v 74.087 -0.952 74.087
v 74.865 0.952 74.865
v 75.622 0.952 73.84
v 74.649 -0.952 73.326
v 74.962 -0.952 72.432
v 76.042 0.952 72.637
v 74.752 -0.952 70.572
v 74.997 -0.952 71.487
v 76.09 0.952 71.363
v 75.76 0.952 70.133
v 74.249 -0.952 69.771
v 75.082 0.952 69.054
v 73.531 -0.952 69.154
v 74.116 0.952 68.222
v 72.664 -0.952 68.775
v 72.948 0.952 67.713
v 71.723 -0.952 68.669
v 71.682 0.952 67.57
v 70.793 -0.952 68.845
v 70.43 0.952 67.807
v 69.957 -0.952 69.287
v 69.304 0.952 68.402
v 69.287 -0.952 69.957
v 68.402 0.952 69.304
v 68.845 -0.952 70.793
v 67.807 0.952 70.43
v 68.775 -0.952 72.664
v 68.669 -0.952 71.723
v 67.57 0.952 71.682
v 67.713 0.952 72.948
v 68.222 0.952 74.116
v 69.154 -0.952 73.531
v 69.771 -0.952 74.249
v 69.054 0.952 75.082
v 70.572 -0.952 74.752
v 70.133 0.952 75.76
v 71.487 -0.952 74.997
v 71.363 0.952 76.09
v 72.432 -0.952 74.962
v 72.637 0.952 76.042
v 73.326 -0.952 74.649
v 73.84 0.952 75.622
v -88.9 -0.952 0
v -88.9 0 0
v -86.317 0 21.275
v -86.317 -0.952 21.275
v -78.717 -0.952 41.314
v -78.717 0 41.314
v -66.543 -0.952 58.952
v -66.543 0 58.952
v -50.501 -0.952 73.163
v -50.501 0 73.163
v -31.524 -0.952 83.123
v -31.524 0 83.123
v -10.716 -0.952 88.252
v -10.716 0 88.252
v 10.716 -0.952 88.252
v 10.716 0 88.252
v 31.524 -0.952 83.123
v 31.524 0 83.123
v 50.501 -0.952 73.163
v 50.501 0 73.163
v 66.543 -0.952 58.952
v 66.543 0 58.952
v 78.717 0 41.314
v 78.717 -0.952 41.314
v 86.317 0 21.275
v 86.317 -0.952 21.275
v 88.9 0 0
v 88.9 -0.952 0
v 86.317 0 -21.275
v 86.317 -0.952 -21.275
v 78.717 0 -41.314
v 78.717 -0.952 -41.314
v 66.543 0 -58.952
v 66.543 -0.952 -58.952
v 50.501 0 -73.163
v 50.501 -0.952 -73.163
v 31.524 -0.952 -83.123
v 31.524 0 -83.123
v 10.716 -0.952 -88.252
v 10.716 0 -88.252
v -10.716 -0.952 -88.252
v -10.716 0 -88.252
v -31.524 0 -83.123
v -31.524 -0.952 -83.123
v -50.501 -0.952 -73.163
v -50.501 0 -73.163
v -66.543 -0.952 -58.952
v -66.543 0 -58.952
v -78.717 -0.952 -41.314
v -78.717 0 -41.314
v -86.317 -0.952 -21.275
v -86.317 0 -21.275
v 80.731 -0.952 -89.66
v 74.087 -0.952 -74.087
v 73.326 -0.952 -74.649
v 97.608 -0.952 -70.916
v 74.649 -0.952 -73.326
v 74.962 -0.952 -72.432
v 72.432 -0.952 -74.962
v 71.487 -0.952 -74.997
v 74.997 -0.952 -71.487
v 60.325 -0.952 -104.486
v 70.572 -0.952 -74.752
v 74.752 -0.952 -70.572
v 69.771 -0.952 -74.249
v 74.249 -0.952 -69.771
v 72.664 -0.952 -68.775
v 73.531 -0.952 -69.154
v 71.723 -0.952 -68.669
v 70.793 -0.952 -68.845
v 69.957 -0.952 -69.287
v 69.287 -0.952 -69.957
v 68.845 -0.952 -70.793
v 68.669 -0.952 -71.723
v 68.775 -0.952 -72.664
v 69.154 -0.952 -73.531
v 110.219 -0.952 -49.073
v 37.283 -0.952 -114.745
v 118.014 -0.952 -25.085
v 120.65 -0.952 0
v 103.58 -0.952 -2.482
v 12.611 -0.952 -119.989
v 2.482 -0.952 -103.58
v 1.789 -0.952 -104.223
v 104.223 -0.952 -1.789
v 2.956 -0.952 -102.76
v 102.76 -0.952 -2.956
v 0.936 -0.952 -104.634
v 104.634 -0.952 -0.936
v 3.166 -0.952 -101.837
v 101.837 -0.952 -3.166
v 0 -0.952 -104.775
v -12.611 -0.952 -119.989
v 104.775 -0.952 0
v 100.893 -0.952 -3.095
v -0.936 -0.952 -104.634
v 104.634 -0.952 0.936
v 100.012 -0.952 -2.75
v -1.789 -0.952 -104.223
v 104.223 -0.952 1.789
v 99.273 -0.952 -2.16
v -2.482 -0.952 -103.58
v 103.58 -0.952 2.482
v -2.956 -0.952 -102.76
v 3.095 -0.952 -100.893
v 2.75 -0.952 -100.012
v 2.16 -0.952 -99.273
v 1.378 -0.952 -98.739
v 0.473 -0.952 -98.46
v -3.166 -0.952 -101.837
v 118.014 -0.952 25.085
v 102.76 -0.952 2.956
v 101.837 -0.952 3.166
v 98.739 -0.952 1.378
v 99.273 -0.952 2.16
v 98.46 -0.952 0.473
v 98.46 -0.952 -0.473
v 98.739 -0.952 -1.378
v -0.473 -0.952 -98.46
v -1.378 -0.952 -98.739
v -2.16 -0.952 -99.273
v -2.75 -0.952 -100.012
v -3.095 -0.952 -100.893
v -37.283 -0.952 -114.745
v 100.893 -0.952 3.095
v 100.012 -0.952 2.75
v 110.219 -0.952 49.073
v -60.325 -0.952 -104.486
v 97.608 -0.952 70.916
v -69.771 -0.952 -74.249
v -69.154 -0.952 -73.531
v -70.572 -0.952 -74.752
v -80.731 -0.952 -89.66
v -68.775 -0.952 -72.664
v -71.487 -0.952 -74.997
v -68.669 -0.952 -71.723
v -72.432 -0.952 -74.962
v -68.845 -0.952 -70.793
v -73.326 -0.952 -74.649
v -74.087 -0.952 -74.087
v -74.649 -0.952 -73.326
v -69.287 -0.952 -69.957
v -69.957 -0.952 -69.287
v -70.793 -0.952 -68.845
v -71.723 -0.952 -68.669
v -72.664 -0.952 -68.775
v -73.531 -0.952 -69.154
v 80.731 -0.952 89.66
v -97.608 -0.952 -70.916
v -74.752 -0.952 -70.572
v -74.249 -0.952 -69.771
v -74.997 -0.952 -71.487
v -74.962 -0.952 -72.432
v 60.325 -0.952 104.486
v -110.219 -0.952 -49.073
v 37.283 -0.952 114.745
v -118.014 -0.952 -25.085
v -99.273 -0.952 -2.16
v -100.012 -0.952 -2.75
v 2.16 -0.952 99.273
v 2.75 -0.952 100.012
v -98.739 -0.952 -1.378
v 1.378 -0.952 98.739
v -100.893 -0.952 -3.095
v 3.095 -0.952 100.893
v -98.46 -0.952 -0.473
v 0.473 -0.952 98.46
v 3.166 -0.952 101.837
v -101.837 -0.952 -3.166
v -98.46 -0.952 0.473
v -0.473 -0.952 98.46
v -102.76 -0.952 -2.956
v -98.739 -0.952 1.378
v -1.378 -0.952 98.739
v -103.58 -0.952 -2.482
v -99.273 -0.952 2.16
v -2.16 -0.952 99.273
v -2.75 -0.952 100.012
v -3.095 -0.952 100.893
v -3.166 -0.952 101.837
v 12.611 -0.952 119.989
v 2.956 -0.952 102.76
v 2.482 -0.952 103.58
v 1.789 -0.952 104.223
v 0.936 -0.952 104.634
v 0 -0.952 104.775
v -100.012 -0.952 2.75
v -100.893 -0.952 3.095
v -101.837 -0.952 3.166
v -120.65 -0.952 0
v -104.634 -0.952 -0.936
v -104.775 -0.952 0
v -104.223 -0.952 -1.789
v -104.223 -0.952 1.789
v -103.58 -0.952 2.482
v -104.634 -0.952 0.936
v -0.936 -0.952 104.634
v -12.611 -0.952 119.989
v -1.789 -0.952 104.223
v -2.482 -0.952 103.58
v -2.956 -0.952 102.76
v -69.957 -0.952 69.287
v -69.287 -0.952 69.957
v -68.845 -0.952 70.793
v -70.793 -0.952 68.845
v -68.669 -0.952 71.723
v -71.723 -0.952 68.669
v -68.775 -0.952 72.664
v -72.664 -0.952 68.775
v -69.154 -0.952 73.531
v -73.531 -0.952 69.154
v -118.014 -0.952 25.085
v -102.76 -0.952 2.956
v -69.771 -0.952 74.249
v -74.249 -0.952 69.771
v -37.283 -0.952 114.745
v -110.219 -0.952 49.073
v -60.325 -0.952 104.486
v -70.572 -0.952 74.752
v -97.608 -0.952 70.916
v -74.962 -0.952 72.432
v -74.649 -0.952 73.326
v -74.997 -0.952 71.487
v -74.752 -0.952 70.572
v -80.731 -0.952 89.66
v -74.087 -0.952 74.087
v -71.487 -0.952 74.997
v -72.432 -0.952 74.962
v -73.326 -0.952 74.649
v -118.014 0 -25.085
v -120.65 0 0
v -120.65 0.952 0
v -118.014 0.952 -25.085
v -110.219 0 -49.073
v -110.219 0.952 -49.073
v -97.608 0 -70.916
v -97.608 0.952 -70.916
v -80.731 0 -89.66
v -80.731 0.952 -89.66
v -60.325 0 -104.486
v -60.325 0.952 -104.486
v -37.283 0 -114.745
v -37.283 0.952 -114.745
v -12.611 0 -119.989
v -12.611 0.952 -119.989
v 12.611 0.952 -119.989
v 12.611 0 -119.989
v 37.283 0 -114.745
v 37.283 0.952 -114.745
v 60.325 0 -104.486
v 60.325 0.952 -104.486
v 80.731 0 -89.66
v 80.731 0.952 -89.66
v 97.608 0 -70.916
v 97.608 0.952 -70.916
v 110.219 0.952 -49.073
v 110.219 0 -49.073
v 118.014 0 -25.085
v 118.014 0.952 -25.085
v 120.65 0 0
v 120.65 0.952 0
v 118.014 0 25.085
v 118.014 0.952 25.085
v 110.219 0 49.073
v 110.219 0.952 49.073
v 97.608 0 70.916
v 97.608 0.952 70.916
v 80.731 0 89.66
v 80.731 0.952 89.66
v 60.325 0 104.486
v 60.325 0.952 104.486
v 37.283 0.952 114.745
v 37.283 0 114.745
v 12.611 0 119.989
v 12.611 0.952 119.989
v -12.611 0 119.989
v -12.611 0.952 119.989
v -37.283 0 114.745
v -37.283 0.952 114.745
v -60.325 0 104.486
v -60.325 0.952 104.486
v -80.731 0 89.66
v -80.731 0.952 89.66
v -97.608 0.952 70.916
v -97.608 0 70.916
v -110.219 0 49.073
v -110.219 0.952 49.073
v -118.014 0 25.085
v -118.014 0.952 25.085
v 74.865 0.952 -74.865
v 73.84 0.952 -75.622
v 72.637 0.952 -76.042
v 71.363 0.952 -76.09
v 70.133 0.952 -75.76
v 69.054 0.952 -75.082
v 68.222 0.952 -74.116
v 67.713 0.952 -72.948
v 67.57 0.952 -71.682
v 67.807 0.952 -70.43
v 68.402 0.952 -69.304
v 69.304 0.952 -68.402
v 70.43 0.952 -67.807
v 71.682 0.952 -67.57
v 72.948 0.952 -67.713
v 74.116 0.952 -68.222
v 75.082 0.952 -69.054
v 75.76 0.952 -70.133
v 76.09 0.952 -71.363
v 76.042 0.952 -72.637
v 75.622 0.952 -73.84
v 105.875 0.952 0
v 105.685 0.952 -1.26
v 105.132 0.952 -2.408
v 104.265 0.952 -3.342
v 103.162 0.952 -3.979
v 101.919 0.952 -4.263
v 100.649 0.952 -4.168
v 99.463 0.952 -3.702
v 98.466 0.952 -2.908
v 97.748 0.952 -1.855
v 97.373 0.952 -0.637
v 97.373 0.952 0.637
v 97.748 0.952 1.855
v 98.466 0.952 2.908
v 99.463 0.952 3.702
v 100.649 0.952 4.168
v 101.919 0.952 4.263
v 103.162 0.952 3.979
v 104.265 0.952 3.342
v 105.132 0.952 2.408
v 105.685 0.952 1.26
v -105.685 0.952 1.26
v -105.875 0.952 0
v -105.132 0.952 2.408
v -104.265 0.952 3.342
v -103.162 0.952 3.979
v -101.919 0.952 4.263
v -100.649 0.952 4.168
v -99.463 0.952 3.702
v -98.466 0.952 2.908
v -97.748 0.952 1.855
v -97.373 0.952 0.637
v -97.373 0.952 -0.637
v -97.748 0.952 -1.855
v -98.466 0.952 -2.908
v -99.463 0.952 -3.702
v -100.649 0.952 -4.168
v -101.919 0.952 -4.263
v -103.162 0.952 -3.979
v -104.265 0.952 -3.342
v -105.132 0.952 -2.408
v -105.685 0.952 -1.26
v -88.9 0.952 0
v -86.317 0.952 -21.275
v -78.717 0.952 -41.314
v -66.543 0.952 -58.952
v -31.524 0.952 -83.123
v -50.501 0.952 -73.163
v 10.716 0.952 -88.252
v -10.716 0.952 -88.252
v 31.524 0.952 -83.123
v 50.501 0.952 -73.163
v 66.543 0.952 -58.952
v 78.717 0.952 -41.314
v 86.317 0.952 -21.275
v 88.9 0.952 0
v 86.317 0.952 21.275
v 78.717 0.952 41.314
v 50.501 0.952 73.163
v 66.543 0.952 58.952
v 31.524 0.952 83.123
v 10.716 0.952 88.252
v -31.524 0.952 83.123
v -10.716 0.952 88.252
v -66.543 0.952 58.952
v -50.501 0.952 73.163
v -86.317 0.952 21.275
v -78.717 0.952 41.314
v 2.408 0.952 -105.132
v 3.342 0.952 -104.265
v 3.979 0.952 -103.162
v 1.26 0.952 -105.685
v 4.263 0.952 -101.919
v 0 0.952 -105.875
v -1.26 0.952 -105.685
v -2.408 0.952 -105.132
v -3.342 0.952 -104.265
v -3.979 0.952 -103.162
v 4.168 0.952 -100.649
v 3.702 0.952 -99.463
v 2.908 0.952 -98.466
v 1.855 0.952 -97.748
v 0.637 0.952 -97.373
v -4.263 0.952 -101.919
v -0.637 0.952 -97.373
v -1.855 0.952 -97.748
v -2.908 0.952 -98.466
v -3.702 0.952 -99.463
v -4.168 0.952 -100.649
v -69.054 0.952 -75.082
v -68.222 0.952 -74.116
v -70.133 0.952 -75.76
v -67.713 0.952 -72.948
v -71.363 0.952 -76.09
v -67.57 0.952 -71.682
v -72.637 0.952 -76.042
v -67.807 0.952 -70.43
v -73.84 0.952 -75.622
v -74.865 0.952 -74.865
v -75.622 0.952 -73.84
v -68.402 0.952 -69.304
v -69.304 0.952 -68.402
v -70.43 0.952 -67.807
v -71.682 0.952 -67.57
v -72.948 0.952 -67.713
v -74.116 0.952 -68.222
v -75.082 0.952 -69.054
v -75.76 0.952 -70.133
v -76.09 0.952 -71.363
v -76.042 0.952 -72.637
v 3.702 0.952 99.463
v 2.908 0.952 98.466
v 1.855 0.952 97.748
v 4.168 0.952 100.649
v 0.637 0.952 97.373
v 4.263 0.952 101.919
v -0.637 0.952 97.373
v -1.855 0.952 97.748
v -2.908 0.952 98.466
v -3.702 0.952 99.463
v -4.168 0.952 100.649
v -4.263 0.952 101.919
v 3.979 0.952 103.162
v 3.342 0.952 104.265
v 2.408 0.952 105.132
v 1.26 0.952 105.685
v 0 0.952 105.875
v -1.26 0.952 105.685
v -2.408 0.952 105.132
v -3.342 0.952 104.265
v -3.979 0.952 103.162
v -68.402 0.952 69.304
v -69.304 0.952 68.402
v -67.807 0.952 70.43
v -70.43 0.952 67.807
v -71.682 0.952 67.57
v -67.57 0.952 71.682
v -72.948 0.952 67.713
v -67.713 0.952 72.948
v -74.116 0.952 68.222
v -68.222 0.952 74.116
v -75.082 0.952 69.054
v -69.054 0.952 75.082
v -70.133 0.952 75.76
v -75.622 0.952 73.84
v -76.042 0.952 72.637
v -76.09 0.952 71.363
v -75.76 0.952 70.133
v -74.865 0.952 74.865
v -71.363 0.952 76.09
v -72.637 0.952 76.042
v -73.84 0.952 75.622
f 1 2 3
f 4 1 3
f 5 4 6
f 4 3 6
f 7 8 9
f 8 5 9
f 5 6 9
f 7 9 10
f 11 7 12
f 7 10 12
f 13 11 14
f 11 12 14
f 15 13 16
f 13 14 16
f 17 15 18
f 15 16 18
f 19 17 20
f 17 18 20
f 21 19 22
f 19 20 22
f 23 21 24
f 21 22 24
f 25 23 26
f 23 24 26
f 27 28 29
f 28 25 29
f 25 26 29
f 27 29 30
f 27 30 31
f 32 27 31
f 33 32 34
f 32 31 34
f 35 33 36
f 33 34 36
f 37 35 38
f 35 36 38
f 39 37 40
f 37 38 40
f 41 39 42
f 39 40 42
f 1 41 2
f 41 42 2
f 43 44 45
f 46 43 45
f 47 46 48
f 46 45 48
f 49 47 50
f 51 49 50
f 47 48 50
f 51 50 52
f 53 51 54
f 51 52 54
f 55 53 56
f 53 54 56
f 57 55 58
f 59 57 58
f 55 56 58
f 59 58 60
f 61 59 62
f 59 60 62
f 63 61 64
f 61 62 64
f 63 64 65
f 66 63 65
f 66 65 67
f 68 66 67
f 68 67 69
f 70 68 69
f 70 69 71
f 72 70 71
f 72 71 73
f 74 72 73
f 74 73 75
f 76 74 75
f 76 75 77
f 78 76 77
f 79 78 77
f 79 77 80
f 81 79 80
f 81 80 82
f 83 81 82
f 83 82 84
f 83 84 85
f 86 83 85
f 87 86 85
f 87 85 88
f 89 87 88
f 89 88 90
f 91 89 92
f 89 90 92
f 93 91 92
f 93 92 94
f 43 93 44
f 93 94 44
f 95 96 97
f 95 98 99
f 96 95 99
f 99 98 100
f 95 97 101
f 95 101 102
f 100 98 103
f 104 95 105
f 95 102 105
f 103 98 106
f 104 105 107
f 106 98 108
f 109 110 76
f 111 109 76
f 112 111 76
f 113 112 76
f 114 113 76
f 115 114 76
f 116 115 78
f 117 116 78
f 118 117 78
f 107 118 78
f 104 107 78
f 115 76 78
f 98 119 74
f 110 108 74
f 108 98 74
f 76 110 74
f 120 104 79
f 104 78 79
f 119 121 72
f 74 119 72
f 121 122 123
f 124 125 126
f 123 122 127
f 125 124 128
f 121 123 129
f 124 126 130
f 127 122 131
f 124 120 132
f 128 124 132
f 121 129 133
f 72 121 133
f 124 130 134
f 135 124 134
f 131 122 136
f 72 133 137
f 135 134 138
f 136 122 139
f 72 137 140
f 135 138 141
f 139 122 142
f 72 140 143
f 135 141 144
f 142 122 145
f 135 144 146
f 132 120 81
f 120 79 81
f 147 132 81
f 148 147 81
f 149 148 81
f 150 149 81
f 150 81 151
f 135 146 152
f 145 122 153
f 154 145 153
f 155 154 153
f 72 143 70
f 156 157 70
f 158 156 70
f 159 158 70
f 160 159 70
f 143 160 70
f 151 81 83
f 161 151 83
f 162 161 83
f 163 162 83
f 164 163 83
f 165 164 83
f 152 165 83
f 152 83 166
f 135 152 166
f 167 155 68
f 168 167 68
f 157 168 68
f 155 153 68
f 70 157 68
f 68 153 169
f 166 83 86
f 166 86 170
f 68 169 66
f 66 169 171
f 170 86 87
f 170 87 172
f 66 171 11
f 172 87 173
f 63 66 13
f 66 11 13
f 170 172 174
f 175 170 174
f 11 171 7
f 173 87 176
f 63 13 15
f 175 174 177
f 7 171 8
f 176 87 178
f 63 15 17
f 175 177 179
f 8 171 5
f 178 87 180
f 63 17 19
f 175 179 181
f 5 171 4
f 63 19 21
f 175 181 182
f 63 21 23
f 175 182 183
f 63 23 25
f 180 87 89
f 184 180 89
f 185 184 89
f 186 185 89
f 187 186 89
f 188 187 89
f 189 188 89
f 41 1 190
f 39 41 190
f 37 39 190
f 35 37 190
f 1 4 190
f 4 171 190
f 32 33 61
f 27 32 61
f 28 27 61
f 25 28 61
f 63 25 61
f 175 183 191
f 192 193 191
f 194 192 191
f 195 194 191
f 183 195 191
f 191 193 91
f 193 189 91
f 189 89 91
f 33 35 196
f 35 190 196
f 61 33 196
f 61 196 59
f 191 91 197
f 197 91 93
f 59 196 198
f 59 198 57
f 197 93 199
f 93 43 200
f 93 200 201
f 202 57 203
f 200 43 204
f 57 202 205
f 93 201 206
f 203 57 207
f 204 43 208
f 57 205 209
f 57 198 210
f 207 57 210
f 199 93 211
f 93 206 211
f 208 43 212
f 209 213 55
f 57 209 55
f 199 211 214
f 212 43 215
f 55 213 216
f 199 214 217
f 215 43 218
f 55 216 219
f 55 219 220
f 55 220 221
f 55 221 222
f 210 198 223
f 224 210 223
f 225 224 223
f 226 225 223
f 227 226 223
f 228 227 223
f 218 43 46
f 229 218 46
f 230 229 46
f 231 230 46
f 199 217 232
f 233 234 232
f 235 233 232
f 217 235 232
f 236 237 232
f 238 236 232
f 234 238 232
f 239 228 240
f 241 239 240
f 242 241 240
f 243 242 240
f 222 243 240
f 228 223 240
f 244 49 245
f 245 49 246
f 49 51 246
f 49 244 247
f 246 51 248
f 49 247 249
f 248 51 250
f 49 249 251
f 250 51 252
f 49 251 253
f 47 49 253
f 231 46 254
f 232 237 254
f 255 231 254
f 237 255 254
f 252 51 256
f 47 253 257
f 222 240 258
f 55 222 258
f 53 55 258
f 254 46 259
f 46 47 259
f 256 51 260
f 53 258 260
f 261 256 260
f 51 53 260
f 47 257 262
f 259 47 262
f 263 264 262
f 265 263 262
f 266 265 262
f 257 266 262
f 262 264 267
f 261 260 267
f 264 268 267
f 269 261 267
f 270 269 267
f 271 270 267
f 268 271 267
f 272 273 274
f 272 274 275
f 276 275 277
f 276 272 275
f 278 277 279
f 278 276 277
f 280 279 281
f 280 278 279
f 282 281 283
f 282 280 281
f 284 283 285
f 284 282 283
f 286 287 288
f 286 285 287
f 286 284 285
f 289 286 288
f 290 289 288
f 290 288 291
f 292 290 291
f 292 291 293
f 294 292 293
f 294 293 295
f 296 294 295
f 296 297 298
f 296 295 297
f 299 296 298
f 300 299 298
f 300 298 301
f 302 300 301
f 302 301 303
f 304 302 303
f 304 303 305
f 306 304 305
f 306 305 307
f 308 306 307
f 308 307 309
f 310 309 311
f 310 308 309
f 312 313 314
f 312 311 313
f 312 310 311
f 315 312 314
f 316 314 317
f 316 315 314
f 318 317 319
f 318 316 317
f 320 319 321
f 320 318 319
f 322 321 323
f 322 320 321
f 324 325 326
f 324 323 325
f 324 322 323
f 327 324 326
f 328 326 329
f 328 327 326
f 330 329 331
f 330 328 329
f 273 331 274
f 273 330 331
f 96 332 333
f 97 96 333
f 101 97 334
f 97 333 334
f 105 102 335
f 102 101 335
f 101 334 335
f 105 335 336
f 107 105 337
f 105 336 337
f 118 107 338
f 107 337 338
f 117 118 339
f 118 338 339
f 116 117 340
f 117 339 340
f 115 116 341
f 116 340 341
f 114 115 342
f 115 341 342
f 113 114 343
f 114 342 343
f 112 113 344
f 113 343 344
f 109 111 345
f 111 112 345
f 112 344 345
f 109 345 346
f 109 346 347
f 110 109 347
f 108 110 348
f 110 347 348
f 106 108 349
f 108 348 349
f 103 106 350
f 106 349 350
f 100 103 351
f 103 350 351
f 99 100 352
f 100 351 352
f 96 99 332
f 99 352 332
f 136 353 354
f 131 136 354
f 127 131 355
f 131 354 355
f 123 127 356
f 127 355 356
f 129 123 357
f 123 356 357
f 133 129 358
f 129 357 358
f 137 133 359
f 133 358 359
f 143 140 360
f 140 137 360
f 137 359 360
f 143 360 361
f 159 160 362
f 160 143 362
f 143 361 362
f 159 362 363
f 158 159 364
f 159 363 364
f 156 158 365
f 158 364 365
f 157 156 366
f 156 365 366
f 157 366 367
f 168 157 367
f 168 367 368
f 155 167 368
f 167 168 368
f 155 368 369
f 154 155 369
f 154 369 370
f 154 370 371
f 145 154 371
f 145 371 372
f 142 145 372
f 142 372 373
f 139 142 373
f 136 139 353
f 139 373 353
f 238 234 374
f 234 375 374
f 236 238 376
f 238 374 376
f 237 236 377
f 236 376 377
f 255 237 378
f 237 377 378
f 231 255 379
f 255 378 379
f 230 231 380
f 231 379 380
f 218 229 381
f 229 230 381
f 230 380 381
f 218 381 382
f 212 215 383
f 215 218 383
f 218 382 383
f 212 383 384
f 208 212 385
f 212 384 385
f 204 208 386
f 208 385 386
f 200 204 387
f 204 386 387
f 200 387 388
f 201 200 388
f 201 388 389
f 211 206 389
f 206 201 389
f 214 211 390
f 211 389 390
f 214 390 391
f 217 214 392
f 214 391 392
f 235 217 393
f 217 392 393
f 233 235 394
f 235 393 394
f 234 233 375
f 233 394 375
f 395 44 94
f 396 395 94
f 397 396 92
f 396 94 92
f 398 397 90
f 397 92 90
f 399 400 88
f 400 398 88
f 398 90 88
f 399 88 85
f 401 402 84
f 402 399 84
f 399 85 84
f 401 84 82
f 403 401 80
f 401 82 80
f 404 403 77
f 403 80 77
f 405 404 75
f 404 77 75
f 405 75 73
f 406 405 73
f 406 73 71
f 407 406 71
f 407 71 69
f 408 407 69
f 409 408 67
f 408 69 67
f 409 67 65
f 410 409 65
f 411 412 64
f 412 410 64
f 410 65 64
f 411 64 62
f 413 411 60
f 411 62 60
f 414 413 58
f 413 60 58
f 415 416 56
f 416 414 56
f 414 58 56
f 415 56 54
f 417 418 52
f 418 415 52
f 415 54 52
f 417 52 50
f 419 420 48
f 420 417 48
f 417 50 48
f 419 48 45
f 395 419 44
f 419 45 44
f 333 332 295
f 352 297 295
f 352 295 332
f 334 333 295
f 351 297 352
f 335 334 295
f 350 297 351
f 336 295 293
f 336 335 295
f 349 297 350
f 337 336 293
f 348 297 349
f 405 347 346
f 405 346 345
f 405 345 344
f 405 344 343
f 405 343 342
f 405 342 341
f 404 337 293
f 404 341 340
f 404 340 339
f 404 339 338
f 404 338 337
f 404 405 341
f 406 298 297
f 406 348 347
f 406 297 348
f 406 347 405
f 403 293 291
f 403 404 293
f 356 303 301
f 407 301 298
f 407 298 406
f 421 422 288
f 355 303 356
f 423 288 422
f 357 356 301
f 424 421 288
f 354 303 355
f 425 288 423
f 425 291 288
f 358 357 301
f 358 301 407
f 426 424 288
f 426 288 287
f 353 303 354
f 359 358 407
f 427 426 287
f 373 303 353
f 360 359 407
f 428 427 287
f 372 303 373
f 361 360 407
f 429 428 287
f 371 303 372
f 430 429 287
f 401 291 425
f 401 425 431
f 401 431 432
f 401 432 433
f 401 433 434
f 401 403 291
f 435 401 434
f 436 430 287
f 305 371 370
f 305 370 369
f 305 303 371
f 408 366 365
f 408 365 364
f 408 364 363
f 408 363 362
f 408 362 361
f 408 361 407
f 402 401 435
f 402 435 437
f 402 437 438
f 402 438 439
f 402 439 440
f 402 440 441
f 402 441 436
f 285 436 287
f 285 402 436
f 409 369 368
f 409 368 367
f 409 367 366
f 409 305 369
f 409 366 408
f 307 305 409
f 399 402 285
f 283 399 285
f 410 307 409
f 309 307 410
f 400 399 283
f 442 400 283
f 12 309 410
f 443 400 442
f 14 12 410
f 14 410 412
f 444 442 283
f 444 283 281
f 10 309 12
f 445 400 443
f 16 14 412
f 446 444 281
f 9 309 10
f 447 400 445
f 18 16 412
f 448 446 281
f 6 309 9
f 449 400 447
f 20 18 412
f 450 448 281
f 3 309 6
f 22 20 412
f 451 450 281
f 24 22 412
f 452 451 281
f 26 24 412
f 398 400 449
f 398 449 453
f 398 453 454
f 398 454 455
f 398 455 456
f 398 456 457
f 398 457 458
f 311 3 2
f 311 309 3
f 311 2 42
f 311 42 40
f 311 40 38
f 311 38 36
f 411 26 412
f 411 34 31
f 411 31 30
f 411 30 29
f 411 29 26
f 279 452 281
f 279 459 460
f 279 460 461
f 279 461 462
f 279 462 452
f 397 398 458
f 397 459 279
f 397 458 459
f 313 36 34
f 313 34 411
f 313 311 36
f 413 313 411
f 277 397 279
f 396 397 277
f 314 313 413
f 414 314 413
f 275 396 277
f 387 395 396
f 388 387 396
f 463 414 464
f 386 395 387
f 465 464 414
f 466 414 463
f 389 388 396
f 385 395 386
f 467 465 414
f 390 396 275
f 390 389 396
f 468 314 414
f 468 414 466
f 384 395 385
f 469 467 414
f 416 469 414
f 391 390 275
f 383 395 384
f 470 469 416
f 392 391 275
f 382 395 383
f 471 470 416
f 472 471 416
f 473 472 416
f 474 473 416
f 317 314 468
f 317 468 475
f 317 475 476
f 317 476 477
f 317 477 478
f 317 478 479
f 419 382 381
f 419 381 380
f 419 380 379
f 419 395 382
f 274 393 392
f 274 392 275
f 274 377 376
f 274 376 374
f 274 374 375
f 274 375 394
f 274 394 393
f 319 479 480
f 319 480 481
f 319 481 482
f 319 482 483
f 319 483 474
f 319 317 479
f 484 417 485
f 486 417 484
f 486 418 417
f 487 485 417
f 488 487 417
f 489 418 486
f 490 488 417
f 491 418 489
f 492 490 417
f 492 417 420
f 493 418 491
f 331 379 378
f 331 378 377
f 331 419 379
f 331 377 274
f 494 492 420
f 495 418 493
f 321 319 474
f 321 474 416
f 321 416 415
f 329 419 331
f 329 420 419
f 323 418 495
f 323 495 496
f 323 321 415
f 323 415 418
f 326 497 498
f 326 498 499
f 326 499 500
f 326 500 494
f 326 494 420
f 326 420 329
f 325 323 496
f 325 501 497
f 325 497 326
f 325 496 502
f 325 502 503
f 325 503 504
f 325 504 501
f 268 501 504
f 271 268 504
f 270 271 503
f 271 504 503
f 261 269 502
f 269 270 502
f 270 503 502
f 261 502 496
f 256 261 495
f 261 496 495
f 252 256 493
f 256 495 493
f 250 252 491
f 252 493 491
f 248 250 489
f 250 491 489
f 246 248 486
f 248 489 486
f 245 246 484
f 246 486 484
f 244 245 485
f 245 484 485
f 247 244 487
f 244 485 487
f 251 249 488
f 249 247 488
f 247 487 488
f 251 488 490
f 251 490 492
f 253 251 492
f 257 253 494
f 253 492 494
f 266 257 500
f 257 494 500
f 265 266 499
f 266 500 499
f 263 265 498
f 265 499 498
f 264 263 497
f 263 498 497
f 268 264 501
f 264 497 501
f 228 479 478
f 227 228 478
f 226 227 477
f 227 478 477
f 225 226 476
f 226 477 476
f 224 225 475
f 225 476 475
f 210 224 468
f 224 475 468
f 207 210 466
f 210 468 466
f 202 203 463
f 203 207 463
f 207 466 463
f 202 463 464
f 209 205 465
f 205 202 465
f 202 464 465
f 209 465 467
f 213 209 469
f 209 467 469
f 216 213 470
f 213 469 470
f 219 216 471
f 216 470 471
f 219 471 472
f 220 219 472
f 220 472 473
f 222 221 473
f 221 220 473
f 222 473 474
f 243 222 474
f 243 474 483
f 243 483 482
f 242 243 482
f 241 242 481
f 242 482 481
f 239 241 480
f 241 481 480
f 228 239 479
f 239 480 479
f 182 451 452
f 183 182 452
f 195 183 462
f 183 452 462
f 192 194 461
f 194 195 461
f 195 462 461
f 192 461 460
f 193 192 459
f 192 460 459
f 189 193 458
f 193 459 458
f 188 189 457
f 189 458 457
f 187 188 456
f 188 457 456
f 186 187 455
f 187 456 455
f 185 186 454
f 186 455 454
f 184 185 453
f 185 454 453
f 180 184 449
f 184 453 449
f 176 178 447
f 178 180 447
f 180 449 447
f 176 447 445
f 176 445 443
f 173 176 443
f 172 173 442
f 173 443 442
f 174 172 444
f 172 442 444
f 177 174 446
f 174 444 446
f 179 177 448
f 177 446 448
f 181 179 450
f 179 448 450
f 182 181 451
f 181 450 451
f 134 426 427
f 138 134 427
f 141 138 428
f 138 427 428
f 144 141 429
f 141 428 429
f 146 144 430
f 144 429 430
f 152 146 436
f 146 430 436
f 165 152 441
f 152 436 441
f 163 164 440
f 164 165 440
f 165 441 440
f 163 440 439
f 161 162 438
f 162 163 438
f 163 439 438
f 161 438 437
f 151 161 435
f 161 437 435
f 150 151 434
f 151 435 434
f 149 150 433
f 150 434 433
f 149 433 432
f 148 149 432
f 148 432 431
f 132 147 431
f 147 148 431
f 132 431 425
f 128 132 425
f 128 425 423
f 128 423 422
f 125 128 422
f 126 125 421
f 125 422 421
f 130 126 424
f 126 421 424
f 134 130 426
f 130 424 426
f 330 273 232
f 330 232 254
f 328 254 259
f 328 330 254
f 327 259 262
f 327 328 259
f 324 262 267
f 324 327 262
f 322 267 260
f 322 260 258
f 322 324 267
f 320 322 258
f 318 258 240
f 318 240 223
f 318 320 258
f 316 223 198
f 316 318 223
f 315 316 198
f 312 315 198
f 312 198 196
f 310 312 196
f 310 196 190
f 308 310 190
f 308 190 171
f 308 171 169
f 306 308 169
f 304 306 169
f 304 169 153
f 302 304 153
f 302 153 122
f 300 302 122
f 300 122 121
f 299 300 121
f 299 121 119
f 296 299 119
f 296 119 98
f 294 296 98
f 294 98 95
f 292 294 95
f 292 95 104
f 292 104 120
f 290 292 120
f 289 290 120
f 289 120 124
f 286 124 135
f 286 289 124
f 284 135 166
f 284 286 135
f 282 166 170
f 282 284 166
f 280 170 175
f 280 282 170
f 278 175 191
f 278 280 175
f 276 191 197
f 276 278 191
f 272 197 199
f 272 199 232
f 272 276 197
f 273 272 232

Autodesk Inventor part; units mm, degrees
ref_plane "YZ Plane" through (0, 0, 0) normal (1, 0, 0) x (0, 1, 0)
ref_plane "XZ Plane" through (0, 0, 0) normal (0, 1, 0) x (-1, 0, 0)
ref_plane "XY Plane" through (0, 0, 0) normal (0, 0, 1) x (1, 0, 0)
sketch "Sketch1" plane through (0, 0, 0) normal (0, 1, 0) x (-1, 0, 0)
  line L0 (0, 7.6) -> (0, -5.7)
  line L1 (-5.7, 0) -> (7.6, 0)
  circle A0 centre (0, 0) radius 120.65
  circle A1 centre (0, 0) radius 88.9
  dimension "d0" = 31.75
  dimension "d1" = 177.8
extrude "Extrusion1" add sketch "Sketch1" along normal mid plane 1.905
sketch "Sketch3" plane through (0, 0, 0) normal (0, 0, 1) x (1, 0, 0)
  line L0 (-120.65, 0.9525) -> (120.65, 0.9525) projected
  line L1 (120.65, -0.9525) -> (-120.65, -0.9525) projected
  line L2 (-101.6, 0.9525) -> (-105.8749, 0.9525)
  line L3 (-105.8749, -0.9525) -> (-101.6, -0.9525)
  line L4 (-105.8749, -0.9525) -> (-98.0406, -0.9525)
  line L5 (-101.6, 0.9525) -> (-101.6, -0.9525)
  line L6 (-101.6, -0.9525) -> (-105.8749, -0.9525)
  line L7 (-88.9, -0.9525) -> (-88.9, 0.9525) projected
  line L8 (-101.6, 0.9525) -> (-105.8749, 0.9525)
  line L9 (-101.6, -0.9525) -> (-104.775, -0.9525)
  line L10 (-104.775, -0.9525) -> (-105.8749, 0.9525)
  dimension "d15" = 12.7
  dimension "d23" = 3.175
  dimension "d25" = 120
revolve "Revolution2" cut sketch "Sketch3" angle 360 about axis through (-101.6, 0.9525, 0) along (0, -1, 0) contours L0 L5 L1 L10
pattern_circular "Circular Pattern2" count 8 over 360 about axis through (0, 0, 0) along (0, 1, 0) of "Revolution2"
properties part number "Vane_Plate"
